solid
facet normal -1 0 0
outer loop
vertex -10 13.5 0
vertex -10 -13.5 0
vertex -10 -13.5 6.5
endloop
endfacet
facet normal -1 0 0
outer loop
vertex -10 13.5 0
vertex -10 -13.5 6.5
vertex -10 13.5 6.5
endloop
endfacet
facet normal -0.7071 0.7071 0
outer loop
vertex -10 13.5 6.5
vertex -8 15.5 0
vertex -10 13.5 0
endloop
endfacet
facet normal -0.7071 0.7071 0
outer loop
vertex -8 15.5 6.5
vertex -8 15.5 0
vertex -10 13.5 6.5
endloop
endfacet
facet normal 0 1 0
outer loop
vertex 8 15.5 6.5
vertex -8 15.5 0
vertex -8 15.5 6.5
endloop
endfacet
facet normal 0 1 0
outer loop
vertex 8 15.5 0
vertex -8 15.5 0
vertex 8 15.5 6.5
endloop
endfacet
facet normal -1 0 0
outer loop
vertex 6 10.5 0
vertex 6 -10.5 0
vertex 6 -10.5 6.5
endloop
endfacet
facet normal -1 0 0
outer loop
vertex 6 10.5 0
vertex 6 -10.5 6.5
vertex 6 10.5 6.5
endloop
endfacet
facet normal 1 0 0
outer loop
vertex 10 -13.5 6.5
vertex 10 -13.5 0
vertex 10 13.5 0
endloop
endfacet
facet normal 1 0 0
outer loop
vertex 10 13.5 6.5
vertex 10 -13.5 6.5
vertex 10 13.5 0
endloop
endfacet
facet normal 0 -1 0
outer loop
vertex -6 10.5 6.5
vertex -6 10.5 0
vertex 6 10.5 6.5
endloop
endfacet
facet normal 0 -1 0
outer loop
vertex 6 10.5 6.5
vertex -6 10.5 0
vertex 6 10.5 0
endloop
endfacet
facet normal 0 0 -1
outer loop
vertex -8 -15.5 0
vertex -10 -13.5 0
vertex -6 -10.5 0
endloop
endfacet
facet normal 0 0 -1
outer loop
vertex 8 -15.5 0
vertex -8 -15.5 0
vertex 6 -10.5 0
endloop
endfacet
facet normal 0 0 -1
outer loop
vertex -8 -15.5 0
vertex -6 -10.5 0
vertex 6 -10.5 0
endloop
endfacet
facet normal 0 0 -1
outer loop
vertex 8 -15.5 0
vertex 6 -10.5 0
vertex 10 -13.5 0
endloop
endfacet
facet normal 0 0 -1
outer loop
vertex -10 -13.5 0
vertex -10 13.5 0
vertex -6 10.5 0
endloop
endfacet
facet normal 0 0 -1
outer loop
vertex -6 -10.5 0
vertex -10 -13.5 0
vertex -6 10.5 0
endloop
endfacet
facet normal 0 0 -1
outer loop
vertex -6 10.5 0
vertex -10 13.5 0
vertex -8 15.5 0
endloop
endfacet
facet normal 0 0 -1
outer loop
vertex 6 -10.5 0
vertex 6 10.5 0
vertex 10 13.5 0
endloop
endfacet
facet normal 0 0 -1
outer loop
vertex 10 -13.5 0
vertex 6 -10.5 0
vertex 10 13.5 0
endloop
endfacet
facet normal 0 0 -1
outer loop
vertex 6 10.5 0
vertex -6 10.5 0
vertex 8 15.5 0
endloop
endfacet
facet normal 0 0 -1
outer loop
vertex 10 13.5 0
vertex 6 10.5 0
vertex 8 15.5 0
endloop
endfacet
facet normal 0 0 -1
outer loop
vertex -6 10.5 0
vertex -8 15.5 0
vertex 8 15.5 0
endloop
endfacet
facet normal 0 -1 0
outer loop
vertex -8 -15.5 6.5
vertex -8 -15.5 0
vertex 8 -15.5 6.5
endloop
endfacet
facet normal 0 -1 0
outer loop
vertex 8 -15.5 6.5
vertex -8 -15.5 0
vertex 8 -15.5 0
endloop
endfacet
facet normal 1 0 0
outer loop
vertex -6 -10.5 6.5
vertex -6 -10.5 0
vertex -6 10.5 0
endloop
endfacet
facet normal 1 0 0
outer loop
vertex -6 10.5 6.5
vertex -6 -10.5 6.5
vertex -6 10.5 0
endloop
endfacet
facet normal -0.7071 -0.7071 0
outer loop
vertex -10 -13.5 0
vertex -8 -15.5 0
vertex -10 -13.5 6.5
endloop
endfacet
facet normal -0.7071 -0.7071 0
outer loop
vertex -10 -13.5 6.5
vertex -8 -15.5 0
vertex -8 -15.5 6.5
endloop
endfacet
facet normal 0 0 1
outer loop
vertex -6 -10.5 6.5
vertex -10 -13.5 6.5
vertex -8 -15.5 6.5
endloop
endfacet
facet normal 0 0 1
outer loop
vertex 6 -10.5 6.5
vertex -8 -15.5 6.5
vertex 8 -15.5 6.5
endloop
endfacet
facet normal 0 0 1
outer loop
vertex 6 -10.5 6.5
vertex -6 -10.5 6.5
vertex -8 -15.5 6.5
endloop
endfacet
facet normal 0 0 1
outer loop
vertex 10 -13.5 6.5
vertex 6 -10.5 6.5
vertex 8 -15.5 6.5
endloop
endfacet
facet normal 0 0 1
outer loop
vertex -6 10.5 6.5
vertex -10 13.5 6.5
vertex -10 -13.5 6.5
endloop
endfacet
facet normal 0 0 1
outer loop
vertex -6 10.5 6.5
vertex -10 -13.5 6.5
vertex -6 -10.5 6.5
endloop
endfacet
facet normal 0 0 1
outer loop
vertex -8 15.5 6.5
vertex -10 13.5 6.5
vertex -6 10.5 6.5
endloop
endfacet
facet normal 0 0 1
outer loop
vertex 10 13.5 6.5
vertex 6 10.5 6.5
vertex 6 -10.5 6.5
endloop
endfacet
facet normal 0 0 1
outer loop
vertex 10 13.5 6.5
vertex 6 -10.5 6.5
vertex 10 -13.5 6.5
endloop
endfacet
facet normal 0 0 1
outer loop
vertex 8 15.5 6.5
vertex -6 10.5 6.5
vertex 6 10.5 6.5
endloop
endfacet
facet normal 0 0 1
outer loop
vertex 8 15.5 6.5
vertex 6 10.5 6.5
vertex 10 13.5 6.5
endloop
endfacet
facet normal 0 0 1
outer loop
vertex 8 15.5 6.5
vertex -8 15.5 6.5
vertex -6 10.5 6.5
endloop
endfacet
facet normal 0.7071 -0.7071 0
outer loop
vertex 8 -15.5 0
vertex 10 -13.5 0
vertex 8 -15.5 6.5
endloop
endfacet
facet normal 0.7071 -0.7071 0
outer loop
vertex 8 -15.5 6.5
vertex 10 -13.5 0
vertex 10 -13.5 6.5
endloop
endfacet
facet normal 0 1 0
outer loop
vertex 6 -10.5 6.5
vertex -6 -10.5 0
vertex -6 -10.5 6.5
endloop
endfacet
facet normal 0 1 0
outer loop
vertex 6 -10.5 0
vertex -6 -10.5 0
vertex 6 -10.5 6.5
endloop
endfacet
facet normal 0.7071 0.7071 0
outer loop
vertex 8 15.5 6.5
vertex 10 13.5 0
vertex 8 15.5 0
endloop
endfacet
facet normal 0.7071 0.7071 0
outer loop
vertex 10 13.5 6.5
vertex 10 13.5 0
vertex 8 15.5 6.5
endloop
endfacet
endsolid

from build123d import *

# Parameters (mm, degrees)
SKETCH1_W           = 20
SKETCH1_H           = 31
SKETCH1_W_2         = 12
SKETCH1_H_2         = 21
BOSS_EXTRUDE1_DEPTH = 6.5
CHAMFER1_SIZE       = 2


with BuildPart() as part:
    # Sketch1 → Boss-Extrude1 (new body)
    with BuildSketch(Plane.XY):
        Rectangle(SKETCH1_W, SKETCH1_H)
        Rectangle(SKETCH1_W_2, SKETCH1_H_2, mode=Mode.SUBTRACT)
    extrude(amount=BOSS_EXTRUDE1_DEPTH)

    # Chamfer1
    chamfer1_edges = [part.edges().sort_by_distance(p)[0] for p in [
        (10, -15.5, 3.25),
        (-10, -15.5, 3.25),
        (-10, 15.5, 3.25),
        (10, 15.5, 3.25),
    ]]
    chamfer(chamfer1_edges, length=CHAMFER1_SIZE)


solid = part.part
